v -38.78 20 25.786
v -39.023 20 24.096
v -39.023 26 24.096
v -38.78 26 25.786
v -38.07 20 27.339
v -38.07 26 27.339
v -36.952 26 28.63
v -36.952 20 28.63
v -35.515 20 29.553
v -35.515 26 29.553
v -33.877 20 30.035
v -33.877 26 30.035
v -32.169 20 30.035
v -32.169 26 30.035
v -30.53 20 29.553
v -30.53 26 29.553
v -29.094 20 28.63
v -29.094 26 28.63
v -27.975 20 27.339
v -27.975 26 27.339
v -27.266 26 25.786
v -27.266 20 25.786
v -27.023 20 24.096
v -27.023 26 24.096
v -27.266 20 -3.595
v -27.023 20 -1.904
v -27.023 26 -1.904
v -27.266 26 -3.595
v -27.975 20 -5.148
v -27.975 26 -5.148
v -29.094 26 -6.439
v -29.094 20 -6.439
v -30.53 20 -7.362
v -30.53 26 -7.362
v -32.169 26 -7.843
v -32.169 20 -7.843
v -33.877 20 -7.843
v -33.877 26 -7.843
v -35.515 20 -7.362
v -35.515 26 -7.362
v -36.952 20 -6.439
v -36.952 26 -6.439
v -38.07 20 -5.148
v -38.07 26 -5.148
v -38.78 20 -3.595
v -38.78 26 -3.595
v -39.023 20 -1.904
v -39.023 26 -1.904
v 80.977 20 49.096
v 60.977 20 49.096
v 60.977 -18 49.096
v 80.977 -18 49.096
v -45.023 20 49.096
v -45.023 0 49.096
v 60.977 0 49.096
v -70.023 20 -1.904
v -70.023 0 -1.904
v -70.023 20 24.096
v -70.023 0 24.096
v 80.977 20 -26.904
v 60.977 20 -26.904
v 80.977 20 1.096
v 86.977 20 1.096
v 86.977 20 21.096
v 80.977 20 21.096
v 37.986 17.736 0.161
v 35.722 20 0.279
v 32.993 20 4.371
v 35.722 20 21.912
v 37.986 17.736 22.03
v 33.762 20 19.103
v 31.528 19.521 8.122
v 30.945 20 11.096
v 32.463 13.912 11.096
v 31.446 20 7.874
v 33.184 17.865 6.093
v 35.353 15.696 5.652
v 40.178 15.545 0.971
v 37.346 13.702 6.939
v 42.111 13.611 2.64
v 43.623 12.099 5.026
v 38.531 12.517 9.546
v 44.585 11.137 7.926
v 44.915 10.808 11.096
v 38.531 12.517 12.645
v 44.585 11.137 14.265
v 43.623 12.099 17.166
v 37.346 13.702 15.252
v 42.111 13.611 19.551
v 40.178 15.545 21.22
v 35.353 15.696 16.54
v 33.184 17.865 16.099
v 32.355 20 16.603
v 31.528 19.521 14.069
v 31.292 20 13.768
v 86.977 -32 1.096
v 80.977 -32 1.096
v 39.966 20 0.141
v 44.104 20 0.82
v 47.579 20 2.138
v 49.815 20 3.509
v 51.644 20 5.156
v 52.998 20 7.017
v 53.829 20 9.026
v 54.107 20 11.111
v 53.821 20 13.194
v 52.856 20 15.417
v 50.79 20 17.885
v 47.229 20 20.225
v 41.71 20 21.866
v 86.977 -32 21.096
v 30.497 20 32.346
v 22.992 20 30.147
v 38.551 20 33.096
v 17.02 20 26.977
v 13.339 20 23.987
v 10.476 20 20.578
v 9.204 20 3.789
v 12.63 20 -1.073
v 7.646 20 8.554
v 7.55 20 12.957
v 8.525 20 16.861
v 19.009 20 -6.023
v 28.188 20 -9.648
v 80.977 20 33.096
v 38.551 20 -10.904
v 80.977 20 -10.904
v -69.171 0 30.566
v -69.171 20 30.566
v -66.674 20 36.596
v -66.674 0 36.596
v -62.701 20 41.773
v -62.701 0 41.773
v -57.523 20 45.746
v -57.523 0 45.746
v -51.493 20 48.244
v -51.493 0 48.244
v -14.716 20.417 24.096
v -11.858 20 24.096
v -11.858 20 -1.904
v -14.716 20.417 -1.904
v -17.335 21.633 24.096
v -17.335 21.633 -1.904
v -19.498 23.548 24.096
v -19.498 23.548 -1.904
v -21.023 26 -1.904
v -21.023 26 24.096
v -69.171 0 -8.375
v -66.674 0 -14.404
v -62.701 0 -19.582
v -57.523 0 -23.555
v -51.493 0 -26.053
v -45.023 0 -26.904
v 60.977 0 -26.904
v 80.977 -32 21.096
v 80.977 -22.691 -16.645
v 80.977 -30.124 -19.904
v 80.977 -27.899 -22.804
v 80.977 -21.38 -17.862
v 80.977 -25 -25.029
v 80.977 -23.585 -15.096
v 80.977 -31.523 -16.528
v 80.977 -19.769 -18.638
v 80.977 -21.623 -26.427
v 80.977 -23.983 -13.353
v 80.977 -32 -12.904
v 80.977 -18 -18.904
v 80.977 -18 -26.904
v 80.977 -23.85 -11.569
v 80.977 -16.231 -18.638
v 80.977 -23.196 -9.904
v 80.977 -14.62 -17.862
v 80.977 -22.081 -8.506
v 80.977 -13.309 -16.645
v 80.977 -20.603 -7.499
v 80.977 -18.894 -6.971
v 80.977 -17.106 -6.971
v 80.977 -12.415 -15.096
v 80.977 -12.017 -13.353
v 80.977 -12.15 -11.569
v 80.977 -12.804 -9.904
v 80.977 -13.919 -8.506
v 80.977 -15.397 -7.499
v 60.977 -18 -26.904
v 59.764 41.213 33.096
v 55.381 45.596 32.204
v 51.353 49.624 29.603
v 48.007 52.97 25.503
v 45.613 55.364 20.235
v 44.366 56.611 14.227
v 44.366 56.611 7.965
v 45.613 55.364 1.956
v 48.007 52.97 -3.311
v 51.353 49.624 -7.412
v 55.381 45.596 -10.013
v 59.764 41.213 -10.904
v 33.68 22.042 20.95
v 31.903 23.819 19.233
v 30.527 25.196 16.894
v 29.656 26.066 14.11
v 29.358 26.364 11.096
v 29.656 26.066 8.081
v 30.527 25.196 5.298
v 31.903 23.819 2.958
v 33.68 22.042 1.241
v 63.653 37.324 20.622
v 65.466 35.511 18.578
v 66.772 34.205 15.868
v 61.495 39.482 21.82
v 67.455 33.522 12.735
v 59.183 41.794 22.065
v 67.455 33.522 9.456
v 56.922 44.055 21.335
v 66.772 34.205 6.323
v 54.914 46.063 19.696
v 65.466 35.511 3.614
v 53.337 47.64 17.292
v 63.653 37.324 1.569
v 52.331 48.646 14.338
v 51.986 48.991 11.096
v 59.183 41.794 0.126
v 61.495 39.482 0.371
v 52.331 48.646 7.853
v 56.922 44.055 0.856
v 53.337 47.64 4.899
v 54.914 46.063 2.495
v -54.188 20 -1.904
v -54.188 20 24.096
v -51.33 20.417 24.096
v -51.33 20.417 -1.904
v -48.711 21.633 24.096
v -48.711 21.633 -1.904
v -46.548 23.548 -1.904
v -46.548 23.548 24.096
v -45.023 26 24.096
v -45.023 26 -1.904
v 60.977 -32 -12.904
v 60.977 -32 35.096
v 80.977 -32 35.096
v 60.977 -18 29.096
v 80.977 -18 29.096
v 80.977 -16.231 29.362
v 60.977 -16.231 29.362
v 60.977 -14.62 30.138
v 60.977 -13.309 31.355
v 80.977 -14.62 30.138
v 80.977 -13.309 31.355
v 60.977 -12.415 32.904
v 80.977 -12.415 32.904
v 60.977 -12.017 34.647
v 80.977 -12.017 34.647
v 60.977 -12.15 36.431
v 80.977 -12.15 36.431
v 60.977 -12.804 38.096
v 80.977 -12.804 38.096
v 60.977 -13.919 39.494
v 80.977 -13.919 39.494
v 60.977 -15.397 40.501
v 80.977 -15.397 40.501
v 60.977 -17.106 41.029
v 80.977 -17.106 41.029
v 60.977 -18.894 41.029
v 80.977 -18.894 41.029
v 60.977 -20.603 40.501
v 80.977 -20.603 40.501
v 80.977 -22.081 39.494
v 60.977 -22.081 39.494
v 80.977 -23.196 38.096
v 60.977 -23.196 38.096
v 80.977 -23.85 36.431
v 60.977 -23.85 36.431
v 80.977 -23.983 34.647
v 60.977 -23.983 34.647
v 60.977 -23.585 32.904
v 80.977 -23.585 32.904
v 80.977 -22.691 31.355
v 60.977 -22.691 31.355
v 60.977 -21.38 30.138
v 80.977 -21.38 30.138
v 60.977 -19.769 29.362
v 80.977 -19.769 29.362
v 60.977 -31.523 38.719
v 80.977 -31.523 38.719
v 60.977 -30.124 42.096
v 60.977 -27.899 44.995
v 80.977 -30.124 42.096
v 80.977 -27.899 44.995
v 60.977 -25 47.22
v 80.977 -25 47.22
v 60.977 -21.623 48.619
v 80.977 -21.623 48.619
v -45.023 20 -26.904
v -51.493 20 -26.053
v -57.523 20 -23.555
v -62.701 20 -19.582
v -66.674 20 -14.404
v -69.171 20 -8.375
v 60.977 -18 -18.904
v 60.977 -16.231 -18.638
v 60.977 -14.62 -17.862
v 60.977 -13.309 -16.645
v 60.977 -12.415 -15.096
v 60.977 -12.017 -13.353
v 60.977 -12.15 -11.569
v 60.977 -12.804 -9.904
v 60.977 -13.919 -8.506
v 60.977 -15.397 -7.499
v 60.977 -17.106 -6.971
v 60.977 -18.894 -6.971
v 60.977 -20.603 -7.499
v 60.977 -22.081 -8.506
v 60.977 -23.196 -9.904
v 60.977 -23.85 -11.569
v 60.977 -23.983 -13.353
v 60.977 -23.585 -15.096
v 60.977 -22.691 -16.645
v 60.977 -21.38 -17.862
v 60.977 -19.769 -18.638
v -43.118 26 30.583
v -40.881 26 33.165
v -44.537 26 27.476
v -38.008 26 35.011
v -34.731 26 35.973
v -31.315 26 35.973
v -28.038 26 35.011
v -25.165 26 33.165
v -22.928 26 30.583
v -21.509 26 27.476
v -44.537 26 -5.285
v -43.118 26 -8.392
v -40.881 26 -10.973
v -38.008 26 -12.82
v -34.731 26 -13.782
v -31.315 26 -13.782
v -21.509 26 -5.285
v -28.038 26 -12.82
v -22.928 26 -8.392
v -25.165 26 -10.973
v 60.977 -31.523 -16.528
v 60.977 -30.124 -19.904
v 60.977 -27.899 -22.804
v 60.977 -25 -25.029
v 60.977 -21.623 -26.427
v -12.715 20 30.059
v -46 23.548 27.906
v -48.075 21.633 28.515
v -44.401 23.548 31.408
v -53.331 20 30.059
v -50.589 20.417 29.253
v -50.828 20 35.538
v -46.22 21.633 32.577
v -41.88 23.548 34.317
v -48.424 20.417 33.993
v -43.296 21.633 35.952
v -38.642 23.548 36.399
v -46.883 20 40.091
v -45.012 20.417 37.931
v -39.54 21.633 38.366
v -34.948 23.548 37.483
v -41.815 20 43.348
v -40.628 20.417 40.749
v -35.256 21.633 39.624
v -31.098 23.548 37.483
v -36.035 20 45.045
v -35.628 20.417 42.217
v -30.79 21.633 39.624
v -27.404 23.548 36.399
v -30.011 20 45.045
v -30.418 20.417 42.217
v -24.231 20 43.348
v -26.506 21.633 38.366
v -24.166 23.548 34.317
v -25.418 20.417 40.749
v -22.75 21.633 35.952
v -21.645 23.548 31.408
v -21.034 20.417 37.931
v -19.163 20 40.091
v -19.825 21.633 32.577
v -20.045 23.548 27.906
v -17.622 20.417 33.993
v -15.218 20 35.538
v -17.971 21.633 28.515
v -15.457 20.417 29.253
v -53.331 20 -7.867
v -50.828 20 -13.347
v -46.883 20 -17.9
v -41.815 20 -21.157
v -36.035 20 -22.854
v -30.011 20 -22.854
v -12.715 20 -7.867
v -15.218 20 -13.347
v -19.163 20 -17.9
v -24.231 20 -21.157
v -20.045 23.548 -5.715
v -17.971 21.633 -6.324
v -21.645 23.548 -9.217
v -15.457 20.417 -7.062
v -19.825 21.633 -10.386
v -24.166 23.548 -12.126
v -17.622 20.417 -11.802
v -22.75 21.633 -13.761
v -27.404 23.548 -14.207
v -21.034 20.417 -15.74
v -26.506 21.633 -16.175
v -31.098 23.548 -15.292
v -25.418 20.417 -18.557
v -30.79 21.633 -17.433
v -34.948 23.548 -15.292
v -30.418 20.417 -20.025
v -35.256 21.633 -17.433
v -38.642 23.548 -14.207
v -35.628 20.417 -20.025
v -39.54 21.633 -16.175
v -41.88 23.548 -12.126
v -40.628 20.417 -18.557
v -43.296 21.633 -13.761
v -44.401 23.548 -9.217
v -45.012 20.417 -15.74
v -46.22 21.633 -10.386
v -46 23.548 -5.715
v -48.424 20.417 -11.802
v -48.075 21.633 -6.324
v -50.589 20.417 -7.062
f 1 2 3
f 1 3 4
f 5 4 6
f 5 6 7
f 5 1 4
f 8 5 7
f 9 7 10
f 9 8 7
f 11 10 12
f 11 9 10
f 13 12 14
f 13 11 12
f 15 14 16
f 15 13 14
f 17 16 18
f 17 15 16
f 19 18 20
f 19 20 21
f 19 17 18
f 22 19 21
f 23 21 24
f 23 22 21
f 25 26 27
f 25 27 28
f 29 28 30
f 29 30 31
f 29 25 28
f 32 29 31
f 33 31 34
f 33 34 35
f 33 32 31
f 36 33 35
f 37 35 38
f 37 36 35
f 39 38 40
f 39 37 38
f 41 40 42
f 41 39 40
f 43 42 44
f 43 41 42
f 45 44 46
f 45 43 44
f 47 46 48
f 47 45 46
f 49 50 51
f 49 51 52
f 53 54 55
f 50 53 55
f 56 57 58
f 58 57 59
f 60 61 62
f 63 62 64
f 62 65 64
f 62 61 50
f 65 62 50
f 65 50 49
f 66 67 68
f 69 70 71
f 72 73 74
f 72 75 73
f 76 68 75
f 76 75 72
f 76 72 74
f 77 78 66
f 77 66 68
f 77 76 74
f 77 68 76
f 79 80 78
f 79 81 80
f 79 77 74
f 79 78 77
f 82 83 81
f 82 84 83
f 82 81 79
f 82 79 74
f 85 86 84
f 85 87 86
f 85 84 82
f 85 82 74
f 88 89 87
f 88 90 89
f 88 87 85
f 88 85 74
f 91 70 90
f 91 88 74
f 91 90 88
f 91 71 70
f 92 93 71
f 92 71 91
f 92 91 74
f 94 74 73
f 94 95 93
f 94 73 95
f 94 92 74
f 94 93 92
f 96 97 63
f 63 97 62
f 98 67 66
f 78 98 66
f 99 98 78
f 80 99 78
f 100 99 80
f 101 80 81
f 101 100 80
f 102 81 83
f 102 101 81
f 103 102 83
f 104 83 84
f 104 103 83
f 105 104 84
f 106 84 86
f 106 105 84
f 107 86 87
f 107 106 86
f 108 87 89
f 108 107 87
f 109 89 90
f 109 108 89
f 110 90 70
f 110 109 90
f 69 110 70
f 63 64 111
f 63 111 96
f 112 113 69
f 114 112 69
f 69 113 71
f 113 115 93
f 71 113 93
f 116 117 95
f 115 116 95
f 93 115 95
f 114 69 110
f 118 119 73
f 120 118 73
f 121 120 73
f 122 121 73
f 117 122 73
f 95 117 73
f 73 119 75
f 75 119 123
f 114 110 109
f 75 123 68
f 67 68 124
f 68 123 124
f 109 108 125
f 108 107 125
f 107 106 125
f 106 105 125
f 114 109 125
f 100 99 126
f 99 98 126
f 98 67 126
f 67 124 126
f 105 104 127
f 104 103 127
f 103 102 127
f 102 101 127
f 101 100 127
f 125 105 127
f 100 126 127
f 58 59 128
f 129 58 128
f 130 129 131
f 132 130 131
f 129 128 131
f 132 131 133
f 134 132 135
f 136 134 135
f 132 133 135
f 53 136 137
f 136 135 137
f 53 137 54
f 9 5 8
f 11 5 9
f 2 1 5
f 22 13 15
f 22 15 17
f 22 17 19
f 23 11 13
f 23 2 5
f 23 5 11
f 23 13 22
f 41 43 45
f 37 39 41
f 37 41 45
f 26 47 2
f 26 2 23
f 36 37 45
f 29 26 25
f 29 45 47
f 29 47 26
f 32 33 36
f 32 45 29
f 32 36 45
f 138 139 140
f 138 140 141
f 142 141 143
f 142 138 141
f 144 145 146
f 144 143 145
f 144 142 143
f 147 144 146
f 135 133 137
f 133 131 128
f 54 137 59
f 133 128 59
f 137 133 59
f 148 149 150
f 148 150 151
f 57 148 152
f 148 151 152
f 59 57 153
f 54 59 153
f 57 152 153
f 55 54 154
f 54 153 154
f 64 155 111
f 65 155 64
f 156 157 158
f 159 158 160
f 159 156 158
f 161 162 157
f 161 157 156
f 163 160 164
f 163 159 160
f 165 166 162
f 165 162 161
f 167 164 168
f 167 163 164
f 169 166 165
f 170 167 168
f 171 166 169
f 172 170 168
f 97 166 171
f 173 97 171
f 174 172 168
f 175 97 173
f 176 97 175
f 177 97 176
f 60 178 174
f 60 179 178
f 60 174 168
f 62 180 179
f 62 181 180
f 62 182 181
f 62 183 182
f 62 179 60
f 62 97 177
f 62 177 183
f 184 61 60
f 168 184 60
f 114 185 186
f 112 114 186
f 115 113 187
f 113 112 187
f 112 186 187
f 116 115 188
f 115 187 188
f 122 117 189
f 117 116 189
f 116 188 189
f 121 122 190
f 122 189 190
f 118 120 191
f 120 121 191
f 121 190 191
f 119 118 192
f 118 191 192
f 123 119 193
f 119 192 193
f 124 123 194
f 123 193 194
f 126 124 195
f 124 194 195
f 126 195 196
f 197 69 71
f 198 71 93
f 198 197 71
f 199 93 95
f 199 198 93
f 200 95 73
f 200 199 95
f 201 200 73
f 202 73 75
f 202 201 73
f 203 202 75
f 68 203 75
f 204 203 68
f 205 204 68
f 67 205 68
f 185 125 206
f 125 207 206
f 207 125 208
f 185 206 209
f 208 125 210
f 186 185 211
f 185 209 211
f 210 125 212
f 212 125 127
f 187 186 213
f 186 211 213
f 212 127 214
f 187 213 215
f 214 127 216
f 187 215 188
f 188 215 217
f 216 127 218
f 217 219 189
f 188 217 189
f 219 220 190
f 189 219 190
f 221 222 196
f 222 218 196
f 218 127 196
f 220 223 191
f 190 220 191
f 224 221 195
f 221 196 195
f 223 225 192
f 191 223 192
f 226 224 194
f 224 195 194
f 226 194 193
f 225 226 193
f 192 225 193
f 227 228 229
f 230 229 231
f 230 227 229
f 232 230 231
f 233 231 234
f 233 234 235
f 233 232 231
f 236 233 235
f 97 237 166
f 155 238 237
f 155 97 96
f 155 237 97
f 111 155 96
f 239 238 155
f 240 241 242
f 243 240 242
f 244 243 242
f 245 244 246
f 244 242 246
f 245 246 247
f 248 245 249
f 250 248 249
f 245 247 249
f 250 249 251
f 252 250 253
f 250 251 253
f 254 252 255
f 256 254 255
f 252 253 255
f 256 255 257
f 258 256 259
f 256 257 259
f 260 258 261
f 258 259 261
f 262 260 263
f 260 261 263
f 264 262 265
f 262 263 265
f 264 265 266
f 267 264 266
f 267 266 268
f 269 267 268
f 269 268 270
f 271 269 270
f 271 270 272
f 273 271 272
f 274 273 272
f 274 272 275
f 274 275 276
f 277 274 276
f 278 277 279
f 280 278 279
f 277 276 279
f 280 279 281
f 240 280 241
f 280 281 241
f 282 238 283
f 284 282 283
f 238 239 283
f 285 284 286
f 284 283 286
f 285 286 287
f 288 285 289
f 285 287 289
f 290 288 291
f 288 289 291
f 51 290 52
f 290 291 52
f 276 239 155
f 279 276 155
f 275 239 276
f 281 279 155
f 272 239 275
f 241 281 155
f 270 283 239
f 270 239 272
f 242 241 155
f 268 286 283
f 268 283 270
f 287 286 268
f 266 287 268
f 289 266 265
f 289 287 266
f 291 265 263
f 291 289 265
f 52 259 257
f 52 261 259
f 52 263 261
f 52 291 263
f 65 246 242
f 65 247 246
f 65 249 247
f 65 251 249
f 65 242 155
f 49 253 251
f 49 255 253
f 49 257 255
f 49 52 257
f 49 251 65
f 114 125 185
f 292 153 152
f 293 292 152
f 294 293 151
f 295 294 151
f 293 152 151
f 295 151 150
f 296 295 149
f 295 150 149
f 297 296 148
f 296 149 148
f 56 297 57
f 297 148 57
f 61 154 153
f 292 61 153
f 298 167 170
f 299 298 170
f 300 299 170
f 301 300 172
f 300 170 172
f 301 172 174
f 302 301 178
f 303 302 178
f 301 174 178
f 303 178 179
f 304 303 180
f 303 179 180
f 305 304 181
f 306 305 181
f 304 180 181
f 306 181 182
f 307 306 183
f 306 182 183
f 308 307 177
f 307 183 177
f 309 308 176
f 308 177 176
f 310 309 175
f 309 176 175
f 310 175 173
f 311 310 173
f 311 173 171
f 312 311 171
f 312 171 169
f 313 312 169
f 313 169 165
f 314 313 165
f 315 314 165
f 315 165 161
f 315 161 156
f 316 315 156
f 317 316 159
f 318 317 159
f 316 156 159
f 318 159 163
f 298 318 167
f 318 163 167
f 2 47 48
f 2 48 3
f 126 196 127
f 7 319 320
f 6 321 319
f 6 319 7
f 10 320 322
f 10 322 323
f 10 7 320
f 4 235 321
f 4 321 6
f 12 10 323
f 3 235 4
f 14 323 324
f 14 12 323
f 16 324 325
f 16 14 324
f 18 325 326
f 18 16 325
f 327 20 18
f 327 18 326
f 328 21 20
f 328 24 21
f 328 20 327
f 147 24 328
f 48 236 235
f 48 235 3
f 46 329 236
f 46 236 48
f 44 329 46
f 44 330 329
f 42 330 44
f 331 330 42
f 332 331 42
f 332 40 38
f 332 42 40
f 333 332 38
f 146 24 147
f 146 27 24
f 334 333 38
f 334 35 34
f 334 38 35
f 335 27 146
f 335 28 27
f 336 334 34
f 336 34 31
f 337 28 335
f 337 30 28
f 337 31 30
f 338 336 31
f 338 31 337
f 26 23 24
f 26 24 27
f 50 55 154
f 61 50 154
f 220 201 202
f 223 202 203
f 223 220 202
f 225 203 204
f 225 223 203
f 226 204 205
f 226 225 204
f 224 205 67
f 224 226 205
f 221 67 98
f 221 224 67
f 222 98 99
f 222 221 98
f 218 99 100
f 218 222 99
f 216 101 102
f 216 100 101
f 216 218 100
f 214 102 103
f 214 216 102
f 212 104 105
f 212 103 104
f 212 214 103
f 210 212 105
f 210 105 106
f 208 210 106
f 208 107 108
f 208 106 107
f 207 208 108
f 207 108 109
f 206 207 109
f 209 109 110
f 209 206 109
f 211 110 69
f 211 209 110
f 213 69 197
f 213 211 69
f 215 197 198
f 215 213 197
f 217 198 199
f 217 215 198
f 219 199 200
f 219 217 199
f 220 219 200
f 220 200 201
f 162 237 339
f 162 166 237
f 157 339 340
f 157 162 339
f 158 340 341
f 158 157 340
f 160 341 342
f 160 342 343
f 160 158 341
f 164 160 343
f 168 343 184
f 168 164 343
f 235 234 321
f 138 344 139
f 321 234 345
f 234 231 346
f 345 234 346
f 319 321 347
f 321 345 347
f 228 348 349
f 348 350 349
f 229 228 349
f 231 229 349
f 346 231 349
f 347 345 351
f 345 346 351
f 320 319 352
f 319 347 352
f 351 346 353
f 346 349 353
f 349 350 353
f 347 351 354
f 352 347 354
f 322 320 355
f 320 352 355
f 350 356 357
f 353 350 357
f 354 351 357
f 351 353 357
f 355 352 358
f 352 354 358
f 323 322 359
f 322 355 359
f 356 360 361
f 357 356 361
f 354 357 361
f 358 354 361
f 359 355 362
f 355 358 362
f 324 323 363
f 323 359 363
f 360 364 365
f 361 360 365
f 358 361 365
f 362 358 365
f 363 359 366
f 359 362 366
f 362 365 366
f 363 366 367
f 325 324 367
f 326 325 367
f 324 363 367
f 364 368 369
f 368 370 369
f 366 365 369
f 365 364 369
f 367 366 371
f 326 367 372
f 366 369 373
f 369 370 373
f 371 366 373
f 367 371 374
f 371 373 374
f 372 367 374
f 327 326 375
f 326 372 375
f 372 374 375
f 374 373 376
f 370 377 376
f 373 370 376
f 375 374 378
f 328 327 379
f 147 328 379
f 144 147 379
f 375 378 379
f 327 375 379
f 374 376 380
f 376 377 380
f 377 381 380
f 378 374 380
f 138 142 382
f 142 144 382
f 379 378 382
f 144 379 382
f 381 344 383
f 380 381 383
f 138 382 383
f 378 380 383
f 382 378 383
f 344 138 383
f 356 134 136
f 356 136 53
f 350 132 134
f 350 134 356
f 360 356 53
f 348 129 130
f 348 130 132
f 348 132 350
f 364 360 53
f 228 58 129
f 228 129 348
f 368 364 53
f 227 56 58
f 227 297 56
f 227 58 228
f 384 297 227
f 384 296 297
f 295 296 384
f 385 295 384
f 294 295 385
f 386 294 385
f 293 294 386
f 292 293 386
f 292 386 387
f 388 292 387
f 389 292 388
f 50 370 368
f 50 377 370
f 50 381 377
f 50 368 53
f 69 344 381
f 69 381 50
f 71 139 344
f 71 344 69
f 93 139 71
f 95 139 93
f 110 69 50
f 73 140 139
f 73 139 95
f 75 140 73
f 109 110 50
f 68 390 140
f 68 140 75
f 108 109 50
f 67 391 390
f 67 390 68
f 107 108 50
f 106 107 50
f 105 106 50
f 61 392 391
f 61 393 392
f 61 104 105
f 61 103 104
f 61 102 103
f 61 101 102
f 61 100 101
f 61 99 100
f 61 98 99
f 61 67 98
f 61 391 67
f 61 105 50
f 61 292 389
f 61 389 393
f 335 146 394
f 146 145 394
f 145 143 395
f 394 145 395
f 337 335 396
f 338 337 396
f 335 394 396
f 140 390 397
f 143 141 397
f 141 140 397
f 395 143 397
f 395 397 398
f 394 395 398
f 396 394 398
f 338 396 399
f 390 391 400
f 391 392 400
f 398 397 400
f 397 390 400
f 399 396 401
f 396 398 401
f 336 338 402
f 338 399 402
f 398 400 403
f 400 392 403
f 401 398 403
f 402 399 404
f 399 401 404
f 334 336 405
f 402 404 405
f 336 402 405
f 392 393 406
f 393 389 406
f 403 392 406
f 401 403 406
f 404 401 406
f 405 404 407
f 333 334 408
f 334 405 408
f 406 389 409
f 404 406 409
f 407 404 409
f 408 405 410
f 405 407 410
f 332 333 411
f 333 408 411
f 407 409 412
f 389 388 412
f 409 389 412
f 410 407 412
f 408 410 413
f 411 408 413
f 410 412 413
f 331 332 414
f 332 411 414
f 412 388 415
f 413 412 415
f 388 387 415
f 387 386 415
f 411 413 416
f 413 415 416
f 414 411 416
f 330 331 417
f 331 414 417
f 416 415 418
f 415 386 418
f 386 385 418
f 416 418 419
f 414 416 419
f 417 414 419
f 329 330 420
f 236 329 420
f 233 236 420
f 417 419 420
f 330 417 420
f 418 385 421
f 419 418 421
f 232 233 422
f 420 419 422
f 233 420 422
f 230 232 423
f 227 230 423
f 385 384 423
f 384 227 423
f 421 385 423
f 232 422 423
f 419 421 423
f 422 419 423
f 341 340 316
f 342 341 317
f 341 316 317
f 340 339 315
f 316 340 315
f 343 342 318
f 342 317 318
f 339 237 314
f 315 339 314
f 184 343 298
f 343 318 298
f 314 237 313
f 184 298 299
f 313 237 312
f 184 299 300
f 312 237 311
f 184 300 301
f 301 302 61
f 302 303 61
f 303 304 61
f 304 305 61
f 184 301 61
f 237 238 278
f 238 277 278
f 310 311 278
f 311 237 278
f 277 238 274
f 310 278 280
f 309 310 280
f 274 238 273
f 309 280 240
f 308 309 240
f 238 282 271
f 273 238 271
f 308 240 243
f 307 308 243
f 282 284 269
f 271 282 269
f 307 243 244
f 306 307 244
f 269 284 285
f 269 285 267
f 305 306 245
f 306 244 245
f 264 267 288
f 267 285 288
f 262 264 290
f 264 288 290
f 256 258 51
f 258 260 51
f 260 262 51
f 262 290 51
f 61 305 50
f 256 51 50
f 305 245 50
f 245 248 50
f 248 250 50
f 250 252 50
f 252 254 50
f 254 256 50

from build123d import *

# Parameters (mm, degrees)
BOSS_EXTRUDE1_DEPTH = 20
BOSS_EXTRUDE2_DEPTH = 6
FILLET1_R           = 10
SKETCH3_W           = 20
SKETCH3_H           = 52
BOSS_EXTRUDE3_DEPTH = 76
FILLET2_R           = 14
SKETCH4_W           = 20
SKETCH4_H           = 52
BOSS_EXTRUDE4_DEPTH = 6
BOSS_EXTRUDE5_REACH = 156.071
SKETCH4_3_R         = 6
CUT_EXTRUDE1_DEPTH  = 20
SKETCH4_4_R         = 6
CUT_EXTRUDE2_DEPTH  = 20


with BuildPart() as part:
    # Sketch1 → Boss-Extrude1 (new body)
    with BuildSketch(Plane(origin=(0, 0, 0), x_dir=(1, 0, 0), z_dir=(0, 1, 0))):
        with BuildLine():
            Line((-70.022961628, 1.904377184), (-70.022961628, -24.095622816))
            ThreePointArc((-70.022961628, -24.095622816), (-62.700631157, -41.773292346), (-45.022961628, -49.095622816))
            Line((-45.022961628, -49.095622816), (60.977038372, -49.095622816))
            Line((60.977038372, -49.095622816), (60.977038372, 26.904377184))
            Line((60.977038372, 26.904377184), (-45.022961628, 26.904377184))
            ThreePointArc((-45.022961628, 26.904377184), (-62.700631157, 19.582046714), (-70.022961628, 1.904377184))
        make_face()
    extrude(amount=BOSS_EXTRUDE1_DEPTH)

    # Sketch2 → Boss-Extrude2 (add)
    with BuildSketch(Plane(origin=(0, 20, 0), x_dir=(1, 0, 0), z_dir=(0, 1, 0))):
        with BuildLine():
            Line((-45.022961628, 1.904377184), (-45.022961628, -24.095622816))
            ThreePointArc((-45.022961628, -24.095622816), (-33.022961628, -36.095622816), (-21.022961628, -24.095622816))
            Line((-21.022961628, -24.095622816), (-21.022961628, 1.904377184))
            ThreePointArc((-21.022961628, 1.904377184), (-33.022961628, 13.904377184), (-45.022961628, 1.904377184))
        make_face()
        with BuildLine():
            ThreePointArc((-39.022961628, -24.095622816), (-33.022961628, -30.095622816), (-27.022961628, -24.095622816))
            Line((-27.022961628, -24.095622816), (-27.022961628, 1.904377184))
            ThreePointArc((-27.022961628, 1.904377184), (-33.022961628, 7.904377184), (-39.022961628, 1.904377184))
            Line((-39.022961628, 1.904377184), (-39.022961628, -24.095622816))
        make_face(mode=Mode.SUBTRACT)
    extrude(amount=BOSS_EXTRUDE2_DEPTH)

    # Fillet1
    # the kernel refuses this fillet: 10 mm, written as the material it adds along each edge
    with BuildSketch(Plane(origin=(-33.022961628, 20, -1.904377184), x_dir=(1, 0, 0), z_dir=(0, 0, 1))) as fillet1_piece_1:
        with BuildLine():
            CenterArc((21.16515139, 10), FILLET1_R, 203.578178478, 66.421821522)
            Line((12, 6), (11.816696972, 5.92))
            ThreePointArc((11.816696972, 5.92), (11.8, 3), (11.8, 0))
            Line((11.8, 0), (12, -0.2))
            Line((12, -0.2), (21.16515139, -0.2))
            Line((21.16515139, -0.2), (21.16515139, 0))
        make_face()
    revolve(axis=Axis((-33.022961628, 20, -1.904377184), (0, 1, 0)), revolution_arc=180)
    with BuildSketch(Plane(origin=(-45.022961628, 20, -1.904377184), x_dir=(-1, 0, 0), z_dir=(0, 0, 1)), Plane(origin=(-21.022961628, 20, 24.095622816), x_dir=(1, 0, 0), z_dir=(0, 0, -1))) as fillet1_piece_2:
        with BuildLine():
            CenterArc((9.16515139, -10), FILLET1_R, 90, 66.421821522)
            Line((0, -6), (-0.183303028, -5.92))
            ThreePointArc((-0.183303028, -5.92), (-0.2, -3), (-0.2, 0))
            Line((-0.2, 0), (0, 0.2))
            Line((0, 0.2), (9.16515139, 0.2))
            Line((9.16515139, 0.2), (9.16515139, 0))
        make_face()
    extrude(amount=26)
    with BuildSketch(Plane(origin=(-33.022961628, 20, 24.095622816), x_dir=(-1, 0, 0), z_dir=(0, 0, -1))) as fillet1_piece_3:
        with BuildLine():
            CenterArc((21.16515139, 10), FILLET1_R, 203.578178478, 66.421821522)
            Line((12, 6), (11.816696972, 5.92))
            ThreePointArc((11.816696972, 5.92), (11.8, 3), (11.8, 0))
            Line((11.8, 0), (12, -0.2))
            Line((12, -0.2), (21.16515139, -0.2))
            Line((21.16515139, -0.2), (21.16515139, 0))
        make_face()
    revolve(axis=Axis((-33.022961628, 20, 24.095622816), (0, 1, 0)), revolution_arc=180)


with BuildPart() as body_2:
    # Sketch3 → Boss-Extrude3 (new body)
    with BuildSketch(Plane.XY.offset(49.095622816)):
        with Locations((70.977038372, -6)):
            Rectangle(SKETCH3_W, SKETCH3_H)
    extrude(amount=-BOSS_EXTRUDE3_DEPTH)

    # Fillet2
    fillet2_edges = [body_2.edges().sort_by_distance(p)[0] for p in [
        (70.977038372, -32, 49.095622816),
        (70.977038372, -32, -26.904377184),
    ]]
    fillet(fillet2_edges, radius=FILLET2_R)

    # Sketch4 → Boss-Extrude4 (add)
    with BuildSketch(Plane(origin=(80.977038372, 0, 0), x_dir=(0, 0, -1), z_dir=(1, 0, 0))):
        with Locations((-11.095622816, -6)):
            Rectangle(SKETCH4_W, SKETCH4_H)
    extrude(amount=BOSS_EXTRUDE4_DEPTH)

    # Sketch4<3> → Cut-Extrude1 (cut)
    with BuildSketch(Plane(origin=(80.977038372, 0, 0), x_dir=(0, 0, -1), z_dir=(1, 0, 0))):
        with Locations((-35.095622816, -18)):
            Circle(SKETCH4_3_R)
    extrude(amount=-CUT_EXTRUDE1_DEPTH, mode=Mode.SUBTRACT)

    # Sketch4<4> → Cut-Extrude2 (cut)
    with BuildSketch(Plane(origin=(80.977038372, 0, 0), x_dir=(0, 0, -1), z_dir=(1, 0, 0))):
        with Locations((12.904377184, -18)):
            Circle(SKETCH4_4_R)
    extrude(amount=-CUT_EXTRUDE2_DEPTH, mode=Mode.SUBTRACT)


with BuildPart() as body_3:

    # Boss-Extrude5: up to this face of the body (flat: up to its plane)
    boss_extrude5_end = Plane(part.part.faces().sort_by_distance((-33.022961628, 20, 11.095622816))[0])
    # Sketch5 → Boss-Extrude5 (new, up to the picked face)
    with BuildSketch(Plane(origin=(50.488519186, 50.488519186, 0), x_dir=(0.7071067811865464, -0.7071067811865488, 0), z_dir=(0.7071067811865488, 0.7071067811865464, 0)), mode=Mode.PRIVATE) as boss_extrude5_sk1:
        with BuildLine():
            Line((43.11727733, -33.095622816), (13.11727733, -33.095622816))
            ThreePointArc((13.11727733, -33.095622816), (-8.88272267, -11.095622816), (13.11727733, 10.904377184))
            Line((13.11727733, 10.904377184), (43.11727733, 10.904377184))
            Line((43.11727733, 10.904377184), (43.11727733, -33.095622816))
        make_face()
    boss_extrude5_tool1 = split(extrude(boss_extrude5_sk1.sketch, amount=-BOSS_EXTRUDE5_REACH, mode=Mode.PRIVATE), bisect_by=boss_extrude5_end, keep=Keep.BOTH, mode=Mode.PRIVATE)
    add(boss_extrude5_tool1.solids().sort_by(Axis((64.081168, 36.89587, 11.095623), (-0.7071067811865488, -0.7071067811865464, 0)))[0])


with BuildPart() as f_20_0mm_dowel_hole1_tool:
    # Sketch8 → Ø20.0mm Dowel Hole1 (revolve)
    with BuildSketch(Plane(origin=(59.763834937, 41.213203436, 11.095622816), x_dir=(-0.7071067811865464, 0.7071067811865488, 0), z_dir=(0, 0, 1))):
        Polygon((0, 0), (0, 38.609466809), (11, 32), (11, 0), align=None)
    revolve(axis=Axis((64.253962997, 45.703331496, 11.095622816), (-0.7071067811865487, -0.7071067811865464, 0)))


with BuildPart() as part_1:
    add(part.part)

    # Ø20.0mm Dowel Hole1: cut by f_20_0mm_dowel_hole1_tool
    add(f_20_0mm_dowel_hole1_tool.part, mode=Mode.SUBTRACT)


with BuildPart() as body_3_1:
    add(body_3.part)

    # Ø20.0mm Dowel Hole1: cut by f_20_0mm_dowel_hole1_tool
    add(f_20_0mm_dowel_hole1_tool.part, mode=Mode.SUBTRACT)


solid = Compound([body_2.part, part_1.part, body_3_1.part])
